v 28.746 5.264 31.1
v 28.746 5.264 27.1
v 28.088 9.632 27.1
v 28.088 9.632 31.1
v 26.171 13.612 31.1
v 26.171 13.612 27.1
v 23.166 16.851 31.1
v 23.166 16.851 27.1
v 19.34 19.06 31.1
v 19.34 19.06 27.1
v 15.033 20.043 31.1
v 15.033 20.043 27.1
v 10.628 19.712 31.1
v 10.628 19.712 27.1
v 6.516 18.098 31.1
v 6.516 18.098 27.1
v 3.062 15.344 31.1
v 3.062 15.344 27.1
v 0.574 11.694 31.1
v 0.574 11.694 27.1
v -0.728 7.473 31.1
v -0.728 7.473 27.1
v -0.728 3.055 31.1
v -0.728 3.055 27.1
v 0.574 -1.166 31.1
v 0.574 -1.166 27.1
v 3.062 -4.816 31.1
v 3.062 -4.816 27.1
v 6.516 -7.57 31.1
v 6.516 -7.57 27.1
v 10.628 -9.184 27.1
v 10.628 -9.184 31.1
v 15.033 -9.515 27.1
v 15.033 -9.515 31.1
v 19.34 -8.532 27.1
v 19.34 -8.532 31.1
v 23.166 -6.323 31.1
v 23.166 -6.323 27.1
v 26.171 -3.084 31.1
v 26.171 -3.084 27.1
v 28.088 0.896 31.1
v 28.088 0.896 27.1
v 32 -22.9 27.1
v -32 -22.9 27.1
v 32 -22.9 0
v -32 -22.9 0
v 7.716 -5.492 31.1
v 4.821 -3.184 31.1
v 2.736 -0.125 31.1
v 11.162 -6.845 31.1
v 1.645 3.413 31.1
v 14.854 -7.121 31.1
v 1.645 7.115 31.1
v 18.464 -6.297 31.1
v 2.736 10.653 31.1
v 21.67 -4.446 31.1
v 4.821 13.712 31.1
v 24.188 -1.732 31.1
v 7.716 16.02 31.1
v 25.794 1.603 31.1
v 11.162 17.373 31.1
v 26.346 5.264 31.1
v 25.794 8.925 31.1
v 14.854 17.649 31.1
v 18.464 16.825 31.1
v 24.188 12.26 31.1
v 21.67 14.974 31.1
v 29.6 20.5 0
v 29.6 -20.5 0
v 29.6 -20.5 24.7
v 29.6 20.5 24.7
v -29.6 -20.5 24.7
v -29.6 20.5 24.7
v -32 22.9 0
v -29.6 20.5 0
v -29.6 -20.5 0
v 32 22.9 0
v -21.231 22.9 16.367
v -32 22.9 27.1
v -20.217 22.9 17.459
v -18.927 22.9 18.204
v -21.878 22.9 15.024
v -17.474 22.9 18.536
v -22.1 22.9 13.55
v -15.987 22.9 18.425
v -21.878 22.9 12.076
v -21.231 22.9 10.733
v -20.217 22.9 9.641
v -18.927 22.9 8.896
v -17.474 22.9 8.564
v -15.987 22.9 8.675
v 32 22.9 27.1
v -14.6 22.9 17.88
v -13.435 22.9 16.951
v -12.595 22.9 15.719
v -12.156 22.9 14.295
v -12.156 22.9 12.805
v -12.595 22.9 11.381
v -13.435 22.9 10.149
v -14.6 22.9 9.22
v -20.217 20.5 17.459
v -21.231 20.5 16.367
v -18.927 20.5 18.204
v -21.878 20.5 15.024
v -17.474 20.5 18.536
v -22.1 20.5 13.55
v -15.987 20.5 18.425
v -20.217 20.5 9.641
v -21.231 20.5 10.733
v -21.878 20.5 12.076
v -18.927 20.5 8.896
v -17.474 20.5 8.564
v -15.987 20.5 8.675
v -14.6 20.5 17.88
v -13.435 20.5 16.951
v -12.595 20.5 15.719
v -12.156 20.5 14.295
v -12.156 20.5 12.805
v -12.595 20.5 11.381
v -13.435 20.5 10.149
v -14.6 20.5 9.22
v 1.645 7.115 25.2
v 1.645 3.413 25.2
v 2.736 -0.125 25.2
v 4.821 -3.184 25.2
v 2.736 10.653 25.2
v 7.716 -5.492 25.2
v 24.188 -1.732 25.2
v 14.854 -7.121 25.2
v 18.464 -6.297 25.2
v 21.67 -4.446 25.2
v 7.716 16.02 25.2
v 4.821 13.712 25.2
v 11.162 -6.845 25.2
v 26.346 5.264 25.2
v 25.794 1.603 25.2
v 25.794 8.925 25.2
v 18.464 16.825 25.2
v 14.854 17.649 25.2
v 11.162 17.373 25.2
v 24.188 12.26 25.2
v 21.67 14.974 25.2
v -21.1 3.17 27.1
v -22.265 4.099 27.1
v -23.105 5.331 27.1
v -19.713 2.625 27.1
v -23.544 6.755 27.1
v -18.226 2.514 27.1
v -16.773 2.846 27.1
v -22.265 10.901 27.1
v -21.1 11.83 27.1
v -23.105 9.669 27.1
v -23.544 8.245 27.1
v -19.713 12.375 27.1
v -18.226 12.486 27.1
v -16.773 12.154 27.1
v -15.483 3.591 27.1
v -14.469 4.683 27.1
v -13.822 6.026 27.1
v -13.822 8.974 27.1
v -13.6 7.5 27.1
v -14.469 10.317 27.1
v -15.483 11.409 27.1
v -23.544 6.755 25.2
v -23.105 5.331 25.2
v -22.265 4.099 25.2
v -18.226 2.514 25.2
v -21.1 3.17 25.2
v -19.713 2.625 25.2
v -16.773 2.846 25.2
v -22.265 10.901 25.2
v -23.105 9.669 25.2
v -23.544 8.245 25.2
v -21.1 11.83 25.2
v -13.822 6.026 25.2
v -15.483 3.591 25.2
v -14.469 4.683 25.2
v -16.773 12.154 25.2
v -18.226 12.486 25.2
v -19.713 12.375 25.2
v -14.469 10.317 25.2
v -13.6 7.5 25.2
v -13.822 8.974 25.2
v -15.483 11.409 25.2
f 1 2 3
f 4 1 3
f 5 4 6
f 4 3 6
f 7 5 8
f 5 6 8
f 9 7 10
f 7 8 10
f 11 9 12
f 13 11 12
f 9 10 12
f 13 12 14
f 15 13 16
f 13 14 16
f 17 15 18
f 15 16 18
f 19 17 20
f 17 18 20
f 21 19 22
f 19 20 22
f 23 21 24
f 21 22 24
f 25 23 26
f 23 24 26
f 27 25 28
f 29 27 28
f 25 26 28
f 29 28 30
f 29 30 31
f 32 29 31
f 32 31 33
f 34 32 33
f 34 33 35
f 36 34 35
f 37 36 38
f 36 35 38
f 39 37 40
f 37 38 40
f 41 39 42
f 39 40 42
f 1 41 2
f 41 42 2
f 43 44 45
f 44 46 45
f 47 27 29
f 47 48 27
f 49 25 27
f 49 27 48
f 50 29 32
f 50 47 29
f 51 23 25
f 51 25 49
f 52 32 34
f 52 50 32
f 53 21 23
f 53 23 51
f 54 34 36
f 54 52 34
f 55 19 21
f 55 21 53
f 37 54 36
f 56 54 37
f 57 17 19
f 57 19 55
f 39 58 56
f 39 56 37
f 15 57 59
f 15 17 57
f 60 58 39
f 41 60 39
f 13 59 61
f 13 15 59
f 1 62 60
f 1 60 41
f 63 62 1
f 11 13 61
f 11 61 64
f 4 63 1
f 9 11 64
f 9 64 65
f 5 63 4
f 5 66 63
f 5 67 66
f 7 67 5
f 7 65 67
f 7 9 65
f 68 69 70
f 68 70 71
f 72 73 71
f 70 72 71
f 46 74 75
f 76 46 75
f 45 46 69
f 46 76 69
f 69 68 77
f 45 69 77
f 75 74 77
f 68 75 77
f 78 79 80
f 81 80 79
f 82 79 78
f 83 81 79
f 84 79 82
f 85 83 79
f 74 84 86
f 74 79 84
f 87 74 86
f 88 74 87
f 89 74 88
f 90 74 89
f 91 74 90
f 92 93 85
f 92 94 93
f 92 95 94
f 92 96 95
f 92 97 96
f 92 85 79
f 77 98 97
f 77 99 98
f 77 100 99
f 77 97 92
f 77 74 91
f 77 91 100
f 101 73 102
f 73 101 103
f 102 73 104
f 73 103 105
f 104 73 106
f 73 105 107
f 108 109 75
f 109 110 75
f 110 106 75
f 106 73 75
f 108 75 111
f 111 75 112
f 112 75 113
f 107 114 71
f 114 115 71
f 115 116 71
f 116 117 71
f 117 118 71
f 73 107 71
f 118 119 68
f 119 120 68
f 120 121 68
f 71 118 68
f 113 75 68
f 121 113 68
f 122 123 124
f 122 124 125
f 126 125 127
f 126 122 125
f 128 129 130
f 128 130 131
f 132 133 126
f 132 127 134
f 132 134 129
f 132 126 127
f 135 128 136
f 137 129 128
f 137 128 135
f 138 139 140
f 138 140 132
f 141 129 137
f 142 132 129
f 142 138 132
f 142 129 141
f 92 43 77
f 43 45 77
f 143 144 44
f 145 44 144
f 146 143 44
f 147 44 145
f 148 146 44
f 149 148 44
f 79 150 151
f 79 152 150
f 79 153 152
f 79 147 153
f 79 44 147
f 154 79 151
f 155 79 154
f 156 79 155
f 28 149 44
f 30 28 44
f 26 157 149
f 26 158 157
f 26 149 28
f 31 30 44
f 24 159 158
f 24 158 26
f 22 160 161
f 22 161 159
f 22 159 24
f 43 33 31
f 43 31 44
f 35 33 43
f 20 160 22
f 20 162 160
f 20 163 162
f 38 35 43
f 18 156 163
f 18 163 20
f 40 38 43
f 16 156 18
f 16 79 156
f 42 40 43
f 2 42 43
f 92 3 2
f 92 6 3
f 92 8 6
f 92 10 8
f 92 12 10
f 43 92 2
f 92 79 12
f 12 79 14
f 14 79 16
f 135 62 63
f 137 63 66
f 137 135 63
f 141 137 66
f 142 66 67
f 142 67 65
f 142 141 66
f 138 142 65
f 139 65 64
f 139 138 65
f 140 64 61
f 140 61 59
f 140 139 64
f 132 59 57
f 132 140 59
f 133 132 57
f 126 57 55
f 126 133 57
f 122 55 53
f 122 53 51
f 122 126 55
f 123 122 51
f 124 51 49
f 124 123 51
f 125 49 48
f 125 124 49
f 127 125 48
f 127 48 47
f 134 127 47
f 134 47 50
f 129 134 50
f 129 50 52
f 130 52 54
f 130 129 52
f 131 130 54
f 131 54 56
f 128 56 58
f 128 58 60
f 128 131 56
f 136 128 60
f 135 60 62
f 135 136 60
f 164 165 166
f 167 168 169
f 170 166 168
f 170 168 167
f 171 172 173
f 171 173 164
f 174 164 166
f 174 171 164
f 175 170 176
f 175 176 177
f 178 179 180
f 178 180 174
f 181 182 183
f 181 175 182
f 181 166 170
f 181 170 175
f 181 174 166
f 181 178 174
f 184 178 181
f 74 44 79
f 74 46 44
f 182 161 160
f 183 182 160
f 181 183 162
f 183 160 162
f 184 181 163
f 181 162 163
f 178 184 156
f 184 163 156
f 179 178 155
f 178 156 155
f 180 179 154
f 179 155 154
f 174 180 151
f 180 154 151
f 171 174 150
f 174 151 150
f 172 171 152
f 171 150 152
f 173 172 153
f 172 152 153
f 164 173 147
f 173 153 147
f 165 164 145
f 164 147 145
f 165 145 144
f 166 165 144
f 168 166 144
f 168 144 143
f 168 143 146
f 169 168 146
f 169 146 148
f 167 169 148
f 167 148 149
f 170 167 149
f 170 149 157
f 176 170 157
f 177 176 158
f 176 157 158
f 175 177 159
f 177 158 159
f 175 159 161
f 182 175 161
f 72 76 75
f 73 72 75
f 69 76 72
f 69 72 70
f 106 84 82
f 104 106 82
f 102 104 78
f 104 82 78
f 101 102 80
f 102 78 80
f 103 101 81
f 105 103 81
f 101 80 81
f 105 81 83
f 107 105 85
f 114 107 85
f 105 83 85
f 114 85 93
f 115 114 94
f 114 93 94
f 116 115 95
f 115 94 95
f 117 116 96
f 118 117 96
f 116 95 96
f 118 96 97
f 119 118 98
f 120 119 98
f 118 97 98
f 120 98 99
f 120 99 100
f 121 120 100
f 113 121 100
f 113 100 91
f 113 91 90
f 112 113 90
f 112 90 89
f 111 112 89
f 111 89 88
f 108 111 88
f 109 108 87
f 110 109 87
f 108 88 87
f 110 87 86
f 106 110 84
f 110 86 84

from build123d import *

# Parameters (mm, degrees)
F4_W      = 64
F4_H      = 45.8
F4_W_2    = 59.2
F4_H_2    = 41
F5_DEPTH  = 24.7
F6_W      = 64
F6_H      = 45.8
F6_W_2    = 59.2
F6_H_2    = 41
F7_DEPTH  = 2.4
F8_R      = 5
F9_DEPTH  = 1.9
F10_R     = 14.82
F10_R_2   = 12.42
F11_DEPTH = 4
F12_DEPTH = 1.9
F13_R     = 5
F14_DEPTH = 2.4


with BuildPart() as f5:
    # F4 (on Top) → F5 (new body)
    with BuildSketch(Plane.XY):
        Rectangle(F4_W, F4_H)
        Rectangle(F4_W_2, F4_H_2, mode=Mode.SUBTRACT)
    extrude(amount=F5_DEPTH)

    # F6 (on face) → F7 (join)
    with BuildSketch(Plane.XY.offset(24.7)):
        Rectangle(F6_W, F6_H)
        Rectangle(F6_W_2, F6_H_2, mode=Mode.SUBTRACT)
        Rectangle(F6_W_2, F6_H_2)
    extrude(amount=F7_DEPTH)

    # F8 (on face) → F9 (cut)
    with BuildSketch(Plane.XY.offset(27.1)):
        with Locations((-18.6, 7.5)):
            Circle(F8_R)
    extrude(amount=-F9_DEPTH, mode=Mode.SUBTRACT)

    # F10 (on face) → F11 (join)
    with BuildSketch(Plane.XY.offset(27.1)):
        with Locations((13.926, 5.264)):
            Circle(F10_R)
        with Locations((13.926, 5.264)):
            Circle(F10_R_2, mode=Mode.SUBTRACT)
    extrude(amount=F11_DEPTH)

    # F12 (cut): a face of the model
    f12_faces = [f5.faces().sort_by_distance(p)[0] for p in [
        (13.926, 5.264, 27.1),
    ]]
    extrude(f12_faces, amount=-F12_DEPTH, mode=Mode.SUBTRACT)

    # F13 (on face) → F14 (cut)
    with BuildSketch(Plane(origin=(0, 22.9, 0), x_dir=(-1, 0, 0), z_dir=(0, 1, 0))):
        with Locations((17.1, 13.55)):
            Circle(F13_R)
    extrude(amount=-F14_DEPTH, mode=Mode.SUBTRACT)


solid = f5.part
